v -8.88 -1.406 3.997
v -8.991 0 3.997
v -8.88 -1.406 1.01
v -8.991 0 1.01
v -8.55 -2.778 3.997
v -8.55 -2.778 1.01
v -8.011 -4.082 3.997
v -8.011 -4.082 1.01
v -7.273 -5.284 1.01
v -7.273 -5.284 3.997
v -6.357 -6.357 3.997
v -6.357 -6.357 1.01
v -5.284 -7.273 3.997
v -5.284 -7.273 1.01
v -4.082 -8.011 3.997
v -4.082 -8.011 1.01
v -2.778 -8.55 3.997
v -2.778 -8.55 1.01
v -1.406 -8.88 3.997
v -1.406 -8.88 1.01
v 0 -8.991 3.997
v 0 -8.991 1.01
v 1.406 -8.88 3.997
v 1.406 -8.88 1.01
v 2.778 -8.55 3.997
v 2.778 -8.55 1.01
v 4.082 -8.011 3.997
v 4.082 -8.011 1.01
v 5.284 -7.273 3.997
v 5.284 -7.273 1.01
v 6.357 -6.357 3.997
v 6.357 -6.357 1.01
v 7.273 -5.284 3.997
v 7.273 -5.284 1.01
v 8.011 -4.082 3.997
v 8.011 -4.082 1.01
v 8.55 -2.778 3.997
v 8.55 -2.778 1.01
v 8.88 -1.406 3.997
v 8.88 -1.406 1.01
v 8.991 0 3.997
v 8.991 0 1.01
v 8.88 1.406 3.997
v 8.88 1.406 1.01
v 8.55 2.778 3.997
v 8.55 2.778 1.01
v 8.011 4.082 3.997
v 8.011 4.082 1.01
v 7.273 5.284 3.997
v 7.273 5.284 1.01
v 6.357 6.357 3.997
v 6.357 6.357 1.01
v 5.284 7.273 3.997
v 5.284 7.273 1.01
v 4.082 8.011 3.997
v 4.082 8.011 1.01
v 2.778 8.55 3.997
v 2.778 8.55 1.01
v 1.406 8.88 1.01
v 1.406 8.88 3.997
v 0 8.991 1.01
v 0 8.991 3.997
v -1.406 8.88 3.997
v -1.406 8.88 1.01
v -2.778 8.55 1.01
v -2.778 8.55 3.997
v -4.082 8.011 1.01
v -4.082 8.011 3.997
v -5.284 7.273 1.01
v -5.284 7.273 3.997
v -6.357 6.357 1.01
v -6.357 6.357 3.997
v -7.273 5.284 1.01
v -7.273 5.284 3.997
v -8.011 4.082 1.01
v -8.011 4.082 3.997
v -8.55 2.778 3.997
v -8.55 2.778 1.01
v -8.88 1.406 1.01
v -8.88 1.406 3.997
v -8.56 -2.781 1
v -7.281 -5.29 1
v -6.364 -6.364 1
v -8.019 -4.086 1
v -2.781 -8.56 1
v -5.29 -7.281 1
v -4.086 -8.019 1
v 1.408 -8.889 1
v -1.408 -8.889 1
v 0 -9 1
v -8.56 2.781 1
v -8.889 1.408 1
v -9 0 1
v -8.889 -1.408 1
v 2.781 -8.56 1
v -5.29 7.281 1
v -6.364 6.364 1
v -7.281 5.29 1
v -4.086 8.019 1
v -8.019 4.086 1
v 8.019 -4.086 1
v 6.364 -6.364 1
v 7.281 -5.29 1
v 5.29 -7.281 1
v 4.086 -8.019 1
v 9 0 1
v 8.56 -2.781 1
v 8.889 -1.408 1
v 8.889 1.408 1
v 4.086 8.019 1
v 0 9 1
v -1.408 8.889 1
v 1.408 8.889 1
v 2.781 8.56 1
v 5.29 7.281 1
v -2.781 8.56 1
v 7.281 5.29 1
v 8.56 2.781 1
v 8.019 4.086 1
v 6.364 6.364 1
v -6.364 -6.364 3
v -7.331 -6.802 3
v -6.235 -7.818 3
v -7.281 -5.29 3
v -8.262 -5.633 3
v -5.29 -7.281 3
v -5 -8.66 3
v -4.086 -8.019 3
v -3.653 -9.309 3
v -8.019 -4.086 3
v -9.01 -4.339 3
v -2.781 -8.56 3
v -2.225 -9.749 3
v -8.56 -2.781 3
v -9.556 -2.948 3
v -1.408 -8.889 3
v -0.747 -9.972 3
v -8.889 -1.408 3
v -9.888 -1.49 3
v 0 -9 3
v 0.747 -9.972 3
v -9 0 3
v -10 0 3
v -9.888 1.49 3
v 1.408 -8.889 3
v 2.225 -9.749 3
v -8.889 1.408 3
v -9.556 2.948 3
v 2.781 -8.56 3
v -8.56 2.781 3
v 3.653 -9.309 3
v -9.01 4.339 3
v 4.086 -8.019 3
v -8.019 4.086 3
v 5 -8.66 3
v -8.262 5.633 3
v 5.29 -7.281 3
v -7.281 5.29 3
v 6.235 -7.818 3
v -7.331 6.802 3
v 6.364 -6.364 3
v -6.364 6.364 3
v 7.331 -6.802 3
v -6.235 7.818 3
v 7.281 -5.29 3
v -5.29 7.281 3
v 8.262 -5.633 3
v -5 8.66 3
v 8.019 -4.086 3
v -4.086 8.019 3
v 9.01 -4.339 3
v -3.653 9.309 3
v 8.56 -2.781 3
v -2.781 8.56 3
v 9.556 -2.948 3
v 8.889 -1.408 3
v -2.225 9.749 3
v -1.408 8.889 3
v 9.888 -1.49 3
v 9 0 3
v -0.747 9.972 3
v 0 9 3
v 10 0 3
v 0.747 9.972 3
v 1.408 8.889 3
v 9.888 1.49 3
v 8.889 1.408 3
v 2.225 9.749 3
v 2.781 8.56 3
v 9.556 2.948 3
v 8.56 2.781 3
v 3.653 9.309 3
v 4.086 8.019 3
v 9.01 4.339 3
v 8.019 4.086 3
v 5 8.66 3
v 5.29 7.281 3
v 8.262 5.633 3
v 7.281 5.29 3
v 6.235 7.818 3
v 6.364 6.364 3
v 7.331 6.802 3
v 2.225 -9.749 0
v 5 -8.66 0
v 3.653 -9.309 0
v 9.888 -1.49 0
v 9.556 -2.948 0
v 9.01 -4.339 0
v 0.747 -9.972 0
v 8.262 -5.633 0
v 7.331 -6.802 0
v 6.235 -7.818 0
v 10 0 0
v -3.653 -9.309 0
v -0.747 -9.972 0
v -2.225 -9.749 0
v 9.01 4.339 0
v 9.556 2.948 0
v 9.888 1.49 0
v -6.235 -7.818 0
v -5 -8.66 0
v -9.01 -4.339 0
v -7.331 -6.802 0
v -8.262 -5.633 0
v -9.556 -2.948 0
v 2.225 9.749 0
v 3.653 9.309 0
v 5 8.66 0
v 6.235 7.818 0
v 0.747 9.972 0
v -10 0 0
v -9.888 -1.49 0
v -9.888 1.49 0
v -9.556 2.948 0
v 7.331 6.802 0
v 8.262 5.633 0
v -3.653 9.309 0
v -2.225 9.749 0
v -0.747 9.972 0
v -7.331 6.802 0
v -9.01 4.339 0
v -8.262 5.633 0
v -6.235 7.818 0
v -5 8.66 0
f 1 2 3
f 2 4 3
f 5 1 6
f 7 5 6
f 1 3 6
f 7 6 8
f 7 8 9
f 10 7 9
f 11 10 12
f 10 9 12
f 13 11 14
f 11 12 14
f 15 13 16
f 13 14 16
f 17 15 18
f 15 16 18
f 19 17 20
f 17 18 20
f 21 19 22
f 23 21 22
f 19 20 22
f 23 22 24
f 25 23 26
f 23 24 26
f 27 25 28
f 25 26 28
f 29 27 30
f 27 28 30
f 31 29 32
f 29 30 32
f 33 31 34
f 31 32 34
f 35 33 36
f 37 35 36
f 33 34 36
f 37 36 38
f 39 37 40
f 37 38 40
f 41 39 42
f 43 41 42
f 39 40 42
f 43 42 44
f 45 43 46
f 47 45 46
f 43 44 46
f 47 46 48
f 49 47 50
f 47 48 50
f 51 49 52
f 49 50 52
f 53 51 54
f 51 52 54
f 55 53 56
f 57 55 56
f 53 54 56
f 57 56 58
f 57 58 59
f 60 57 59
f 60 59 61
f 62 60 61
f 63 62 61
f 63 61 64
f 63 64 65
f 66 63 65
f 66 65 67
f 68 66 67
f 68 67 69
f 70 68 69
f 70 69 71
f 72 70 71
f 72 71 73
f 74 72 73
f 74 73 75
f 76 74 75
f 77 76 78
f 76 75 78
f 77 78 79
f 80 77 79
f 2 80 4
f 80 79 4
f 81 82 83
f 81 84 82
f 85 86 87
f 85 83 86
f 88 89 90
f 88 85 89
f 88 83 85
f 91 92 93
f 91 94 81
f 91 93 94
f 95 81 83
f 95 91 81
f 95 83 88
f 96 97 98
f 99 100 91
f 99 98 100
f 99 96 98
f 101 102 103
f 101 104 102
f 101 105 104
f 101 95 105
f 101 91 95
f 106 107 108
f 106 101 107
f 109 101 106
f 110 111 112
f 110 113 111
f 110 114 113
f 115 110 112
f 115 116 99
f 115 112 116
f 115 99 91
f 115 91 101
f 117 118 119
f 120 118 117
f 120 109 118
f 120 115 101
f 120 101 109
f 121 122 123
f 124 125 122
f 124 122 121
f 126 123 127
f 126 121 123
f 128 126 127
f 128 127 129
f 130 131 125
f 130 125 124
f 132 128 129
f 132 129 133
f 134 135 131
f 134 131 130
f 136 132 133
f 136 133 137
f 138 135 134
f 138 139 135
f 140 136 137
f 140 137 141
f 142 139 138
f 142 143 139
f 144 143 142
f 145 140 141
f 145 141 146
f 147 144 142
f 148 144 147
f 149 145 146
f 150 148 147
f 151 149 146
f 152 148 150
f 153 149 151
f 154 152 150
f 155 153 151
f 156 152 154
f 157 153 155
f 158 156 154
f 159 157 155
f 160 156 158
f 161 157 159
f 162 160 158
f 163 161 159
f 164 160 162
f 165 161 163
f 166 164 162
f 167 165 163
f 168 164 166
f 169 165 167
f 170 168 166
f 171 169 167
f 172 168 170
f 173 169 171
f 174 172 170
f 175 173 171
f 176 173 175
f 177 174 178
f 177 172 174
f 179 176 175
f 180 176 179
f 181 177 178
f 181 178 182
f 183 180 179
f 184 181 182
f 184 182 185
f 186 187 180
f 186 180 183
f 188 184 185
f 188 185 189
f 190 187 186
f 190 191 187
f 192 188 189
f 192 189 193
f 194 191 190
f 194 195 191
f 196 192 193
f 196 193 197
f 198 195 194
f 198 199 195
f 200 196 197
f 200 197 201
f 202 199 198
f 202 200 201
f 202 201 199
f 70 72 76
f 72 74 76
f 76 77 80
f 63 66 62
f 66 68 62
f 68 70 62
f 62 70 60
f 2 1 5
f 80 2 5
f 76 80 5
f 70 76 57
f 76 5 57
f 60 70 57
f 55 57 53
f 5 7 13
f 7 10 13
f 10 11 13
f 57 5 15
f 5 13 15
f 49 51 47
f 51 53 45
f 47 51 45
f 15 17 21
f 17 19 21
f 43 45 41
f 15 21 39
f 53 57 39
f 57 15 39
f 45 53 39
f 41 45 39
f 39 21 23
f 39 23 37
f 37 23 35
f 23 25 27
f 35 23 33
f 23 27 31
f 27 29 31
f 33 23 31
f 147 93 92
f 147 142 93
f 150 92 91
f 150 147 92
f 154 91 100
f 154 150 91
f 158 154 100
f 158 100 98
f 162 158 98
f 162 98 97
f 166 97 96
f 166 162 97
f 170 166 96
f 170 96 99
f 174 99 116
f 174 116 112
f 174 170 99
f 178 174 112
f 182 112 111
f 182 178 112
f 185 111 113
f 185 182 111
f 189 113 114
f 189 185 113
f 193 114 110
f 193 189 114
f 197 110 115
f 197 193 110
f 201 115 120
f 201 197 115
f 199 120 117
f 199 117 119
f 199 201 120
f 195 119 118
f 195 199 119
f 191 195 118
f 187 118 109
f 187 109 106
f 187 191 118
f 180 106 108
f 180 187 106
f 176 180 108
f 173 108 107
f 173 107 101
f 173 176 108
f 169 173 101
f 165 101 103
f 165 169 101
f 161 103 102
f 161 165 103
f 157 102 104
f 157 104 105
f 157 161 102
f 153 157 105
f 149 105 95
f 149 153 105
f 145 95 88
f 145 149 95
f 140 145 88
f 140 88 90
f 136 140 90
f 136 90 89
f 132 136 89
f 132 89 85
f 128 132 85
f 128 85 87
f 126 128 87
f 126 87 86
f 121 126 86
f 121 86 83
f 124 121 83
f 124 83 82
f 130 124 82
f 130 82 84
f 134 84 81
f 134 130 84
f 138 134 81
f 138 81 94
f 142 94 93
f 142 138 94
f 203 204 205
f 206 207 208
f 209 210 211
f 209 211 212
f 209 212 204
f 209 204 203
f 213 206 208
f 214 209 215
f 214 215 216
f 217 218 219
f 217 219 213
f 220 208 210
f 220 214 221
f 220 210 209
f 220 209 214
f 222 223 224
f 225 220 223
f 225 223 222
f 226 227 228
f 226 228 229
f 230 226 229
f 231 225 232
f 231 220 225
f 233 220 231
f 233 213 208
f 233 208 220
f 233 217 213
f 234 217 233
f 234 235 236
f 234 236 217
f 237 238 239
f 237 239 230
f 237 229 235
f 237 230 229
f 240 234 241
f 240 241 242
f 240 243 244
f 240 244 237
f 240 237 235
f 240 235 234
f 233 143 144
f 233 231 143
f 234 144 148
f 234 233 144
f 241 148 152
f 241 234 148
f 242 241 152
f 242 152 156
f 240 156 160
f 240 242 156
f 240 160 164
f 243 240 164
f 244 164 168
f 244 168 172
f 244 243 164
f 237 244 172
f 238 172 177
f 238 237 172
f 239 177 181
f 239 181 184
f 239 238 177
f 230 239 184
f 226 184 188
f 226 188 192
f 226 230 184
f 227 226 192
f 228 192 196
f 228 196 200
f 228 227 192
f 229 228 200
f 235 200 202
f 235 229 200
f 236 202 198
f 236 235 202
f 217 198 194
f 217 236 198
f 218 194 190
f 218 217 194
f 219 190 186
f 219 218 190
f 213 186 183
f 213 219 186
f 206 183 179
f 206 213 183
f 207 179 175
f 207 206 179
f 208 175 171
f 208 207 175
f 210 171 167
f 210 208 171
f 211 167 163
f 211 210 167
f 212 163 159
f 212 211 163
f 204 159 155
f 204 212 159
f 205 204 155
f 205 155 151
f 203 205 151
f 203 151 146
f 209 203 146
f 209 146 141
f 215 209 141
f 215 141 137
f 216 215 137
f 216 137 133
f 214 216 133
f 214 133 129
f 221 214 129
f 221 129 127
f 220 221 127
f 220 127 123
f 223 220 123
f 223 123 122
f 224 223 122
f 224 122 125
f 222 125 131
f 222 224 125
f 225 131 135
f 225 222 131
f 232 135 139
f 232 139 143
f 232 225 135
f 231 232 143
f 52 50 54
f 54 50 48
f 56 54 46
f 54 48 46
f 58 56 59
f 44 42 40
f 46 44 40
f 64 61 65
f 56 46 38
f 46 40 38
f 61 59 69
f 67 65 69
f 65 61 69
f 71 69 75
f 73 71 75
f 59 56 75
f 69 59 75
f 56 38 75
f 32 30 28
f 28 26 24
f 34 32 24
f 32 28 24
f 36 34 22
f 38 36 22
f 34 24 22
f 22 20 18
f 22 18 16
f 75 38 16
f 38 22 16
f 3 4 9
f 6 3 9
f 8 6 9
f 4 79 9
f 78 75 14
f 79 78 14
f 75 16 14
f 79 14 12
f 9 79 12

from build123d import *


with BuildPart() as f2:
    # F1 (on face) → F2 (revolve)
    with BuildSketch(Plane.XZ):
        Polygon((0, 3.996843), (-8.990511, 3.996843), (-8.990511, 2.996843), (-8.990511, 1.01), (0, 1.01), align=None)
    revolve(axis=Axis((0, 0, 2.503422), (0, 0, 1)))


with BuildPart() as f3:
    # F0 (on Front) → F3 (revolve)
    with BuildSketch(Plane.XZ):
        Polygon((-10, 0), (0, 0), (0, 1), (-9, 1), (-9, 3), (-10, 3), align=None)
    revolve(axis=Axis((0, 0, 0.5), (0, 0, -1)))


solid = Compound([f2.part, f3.part])
